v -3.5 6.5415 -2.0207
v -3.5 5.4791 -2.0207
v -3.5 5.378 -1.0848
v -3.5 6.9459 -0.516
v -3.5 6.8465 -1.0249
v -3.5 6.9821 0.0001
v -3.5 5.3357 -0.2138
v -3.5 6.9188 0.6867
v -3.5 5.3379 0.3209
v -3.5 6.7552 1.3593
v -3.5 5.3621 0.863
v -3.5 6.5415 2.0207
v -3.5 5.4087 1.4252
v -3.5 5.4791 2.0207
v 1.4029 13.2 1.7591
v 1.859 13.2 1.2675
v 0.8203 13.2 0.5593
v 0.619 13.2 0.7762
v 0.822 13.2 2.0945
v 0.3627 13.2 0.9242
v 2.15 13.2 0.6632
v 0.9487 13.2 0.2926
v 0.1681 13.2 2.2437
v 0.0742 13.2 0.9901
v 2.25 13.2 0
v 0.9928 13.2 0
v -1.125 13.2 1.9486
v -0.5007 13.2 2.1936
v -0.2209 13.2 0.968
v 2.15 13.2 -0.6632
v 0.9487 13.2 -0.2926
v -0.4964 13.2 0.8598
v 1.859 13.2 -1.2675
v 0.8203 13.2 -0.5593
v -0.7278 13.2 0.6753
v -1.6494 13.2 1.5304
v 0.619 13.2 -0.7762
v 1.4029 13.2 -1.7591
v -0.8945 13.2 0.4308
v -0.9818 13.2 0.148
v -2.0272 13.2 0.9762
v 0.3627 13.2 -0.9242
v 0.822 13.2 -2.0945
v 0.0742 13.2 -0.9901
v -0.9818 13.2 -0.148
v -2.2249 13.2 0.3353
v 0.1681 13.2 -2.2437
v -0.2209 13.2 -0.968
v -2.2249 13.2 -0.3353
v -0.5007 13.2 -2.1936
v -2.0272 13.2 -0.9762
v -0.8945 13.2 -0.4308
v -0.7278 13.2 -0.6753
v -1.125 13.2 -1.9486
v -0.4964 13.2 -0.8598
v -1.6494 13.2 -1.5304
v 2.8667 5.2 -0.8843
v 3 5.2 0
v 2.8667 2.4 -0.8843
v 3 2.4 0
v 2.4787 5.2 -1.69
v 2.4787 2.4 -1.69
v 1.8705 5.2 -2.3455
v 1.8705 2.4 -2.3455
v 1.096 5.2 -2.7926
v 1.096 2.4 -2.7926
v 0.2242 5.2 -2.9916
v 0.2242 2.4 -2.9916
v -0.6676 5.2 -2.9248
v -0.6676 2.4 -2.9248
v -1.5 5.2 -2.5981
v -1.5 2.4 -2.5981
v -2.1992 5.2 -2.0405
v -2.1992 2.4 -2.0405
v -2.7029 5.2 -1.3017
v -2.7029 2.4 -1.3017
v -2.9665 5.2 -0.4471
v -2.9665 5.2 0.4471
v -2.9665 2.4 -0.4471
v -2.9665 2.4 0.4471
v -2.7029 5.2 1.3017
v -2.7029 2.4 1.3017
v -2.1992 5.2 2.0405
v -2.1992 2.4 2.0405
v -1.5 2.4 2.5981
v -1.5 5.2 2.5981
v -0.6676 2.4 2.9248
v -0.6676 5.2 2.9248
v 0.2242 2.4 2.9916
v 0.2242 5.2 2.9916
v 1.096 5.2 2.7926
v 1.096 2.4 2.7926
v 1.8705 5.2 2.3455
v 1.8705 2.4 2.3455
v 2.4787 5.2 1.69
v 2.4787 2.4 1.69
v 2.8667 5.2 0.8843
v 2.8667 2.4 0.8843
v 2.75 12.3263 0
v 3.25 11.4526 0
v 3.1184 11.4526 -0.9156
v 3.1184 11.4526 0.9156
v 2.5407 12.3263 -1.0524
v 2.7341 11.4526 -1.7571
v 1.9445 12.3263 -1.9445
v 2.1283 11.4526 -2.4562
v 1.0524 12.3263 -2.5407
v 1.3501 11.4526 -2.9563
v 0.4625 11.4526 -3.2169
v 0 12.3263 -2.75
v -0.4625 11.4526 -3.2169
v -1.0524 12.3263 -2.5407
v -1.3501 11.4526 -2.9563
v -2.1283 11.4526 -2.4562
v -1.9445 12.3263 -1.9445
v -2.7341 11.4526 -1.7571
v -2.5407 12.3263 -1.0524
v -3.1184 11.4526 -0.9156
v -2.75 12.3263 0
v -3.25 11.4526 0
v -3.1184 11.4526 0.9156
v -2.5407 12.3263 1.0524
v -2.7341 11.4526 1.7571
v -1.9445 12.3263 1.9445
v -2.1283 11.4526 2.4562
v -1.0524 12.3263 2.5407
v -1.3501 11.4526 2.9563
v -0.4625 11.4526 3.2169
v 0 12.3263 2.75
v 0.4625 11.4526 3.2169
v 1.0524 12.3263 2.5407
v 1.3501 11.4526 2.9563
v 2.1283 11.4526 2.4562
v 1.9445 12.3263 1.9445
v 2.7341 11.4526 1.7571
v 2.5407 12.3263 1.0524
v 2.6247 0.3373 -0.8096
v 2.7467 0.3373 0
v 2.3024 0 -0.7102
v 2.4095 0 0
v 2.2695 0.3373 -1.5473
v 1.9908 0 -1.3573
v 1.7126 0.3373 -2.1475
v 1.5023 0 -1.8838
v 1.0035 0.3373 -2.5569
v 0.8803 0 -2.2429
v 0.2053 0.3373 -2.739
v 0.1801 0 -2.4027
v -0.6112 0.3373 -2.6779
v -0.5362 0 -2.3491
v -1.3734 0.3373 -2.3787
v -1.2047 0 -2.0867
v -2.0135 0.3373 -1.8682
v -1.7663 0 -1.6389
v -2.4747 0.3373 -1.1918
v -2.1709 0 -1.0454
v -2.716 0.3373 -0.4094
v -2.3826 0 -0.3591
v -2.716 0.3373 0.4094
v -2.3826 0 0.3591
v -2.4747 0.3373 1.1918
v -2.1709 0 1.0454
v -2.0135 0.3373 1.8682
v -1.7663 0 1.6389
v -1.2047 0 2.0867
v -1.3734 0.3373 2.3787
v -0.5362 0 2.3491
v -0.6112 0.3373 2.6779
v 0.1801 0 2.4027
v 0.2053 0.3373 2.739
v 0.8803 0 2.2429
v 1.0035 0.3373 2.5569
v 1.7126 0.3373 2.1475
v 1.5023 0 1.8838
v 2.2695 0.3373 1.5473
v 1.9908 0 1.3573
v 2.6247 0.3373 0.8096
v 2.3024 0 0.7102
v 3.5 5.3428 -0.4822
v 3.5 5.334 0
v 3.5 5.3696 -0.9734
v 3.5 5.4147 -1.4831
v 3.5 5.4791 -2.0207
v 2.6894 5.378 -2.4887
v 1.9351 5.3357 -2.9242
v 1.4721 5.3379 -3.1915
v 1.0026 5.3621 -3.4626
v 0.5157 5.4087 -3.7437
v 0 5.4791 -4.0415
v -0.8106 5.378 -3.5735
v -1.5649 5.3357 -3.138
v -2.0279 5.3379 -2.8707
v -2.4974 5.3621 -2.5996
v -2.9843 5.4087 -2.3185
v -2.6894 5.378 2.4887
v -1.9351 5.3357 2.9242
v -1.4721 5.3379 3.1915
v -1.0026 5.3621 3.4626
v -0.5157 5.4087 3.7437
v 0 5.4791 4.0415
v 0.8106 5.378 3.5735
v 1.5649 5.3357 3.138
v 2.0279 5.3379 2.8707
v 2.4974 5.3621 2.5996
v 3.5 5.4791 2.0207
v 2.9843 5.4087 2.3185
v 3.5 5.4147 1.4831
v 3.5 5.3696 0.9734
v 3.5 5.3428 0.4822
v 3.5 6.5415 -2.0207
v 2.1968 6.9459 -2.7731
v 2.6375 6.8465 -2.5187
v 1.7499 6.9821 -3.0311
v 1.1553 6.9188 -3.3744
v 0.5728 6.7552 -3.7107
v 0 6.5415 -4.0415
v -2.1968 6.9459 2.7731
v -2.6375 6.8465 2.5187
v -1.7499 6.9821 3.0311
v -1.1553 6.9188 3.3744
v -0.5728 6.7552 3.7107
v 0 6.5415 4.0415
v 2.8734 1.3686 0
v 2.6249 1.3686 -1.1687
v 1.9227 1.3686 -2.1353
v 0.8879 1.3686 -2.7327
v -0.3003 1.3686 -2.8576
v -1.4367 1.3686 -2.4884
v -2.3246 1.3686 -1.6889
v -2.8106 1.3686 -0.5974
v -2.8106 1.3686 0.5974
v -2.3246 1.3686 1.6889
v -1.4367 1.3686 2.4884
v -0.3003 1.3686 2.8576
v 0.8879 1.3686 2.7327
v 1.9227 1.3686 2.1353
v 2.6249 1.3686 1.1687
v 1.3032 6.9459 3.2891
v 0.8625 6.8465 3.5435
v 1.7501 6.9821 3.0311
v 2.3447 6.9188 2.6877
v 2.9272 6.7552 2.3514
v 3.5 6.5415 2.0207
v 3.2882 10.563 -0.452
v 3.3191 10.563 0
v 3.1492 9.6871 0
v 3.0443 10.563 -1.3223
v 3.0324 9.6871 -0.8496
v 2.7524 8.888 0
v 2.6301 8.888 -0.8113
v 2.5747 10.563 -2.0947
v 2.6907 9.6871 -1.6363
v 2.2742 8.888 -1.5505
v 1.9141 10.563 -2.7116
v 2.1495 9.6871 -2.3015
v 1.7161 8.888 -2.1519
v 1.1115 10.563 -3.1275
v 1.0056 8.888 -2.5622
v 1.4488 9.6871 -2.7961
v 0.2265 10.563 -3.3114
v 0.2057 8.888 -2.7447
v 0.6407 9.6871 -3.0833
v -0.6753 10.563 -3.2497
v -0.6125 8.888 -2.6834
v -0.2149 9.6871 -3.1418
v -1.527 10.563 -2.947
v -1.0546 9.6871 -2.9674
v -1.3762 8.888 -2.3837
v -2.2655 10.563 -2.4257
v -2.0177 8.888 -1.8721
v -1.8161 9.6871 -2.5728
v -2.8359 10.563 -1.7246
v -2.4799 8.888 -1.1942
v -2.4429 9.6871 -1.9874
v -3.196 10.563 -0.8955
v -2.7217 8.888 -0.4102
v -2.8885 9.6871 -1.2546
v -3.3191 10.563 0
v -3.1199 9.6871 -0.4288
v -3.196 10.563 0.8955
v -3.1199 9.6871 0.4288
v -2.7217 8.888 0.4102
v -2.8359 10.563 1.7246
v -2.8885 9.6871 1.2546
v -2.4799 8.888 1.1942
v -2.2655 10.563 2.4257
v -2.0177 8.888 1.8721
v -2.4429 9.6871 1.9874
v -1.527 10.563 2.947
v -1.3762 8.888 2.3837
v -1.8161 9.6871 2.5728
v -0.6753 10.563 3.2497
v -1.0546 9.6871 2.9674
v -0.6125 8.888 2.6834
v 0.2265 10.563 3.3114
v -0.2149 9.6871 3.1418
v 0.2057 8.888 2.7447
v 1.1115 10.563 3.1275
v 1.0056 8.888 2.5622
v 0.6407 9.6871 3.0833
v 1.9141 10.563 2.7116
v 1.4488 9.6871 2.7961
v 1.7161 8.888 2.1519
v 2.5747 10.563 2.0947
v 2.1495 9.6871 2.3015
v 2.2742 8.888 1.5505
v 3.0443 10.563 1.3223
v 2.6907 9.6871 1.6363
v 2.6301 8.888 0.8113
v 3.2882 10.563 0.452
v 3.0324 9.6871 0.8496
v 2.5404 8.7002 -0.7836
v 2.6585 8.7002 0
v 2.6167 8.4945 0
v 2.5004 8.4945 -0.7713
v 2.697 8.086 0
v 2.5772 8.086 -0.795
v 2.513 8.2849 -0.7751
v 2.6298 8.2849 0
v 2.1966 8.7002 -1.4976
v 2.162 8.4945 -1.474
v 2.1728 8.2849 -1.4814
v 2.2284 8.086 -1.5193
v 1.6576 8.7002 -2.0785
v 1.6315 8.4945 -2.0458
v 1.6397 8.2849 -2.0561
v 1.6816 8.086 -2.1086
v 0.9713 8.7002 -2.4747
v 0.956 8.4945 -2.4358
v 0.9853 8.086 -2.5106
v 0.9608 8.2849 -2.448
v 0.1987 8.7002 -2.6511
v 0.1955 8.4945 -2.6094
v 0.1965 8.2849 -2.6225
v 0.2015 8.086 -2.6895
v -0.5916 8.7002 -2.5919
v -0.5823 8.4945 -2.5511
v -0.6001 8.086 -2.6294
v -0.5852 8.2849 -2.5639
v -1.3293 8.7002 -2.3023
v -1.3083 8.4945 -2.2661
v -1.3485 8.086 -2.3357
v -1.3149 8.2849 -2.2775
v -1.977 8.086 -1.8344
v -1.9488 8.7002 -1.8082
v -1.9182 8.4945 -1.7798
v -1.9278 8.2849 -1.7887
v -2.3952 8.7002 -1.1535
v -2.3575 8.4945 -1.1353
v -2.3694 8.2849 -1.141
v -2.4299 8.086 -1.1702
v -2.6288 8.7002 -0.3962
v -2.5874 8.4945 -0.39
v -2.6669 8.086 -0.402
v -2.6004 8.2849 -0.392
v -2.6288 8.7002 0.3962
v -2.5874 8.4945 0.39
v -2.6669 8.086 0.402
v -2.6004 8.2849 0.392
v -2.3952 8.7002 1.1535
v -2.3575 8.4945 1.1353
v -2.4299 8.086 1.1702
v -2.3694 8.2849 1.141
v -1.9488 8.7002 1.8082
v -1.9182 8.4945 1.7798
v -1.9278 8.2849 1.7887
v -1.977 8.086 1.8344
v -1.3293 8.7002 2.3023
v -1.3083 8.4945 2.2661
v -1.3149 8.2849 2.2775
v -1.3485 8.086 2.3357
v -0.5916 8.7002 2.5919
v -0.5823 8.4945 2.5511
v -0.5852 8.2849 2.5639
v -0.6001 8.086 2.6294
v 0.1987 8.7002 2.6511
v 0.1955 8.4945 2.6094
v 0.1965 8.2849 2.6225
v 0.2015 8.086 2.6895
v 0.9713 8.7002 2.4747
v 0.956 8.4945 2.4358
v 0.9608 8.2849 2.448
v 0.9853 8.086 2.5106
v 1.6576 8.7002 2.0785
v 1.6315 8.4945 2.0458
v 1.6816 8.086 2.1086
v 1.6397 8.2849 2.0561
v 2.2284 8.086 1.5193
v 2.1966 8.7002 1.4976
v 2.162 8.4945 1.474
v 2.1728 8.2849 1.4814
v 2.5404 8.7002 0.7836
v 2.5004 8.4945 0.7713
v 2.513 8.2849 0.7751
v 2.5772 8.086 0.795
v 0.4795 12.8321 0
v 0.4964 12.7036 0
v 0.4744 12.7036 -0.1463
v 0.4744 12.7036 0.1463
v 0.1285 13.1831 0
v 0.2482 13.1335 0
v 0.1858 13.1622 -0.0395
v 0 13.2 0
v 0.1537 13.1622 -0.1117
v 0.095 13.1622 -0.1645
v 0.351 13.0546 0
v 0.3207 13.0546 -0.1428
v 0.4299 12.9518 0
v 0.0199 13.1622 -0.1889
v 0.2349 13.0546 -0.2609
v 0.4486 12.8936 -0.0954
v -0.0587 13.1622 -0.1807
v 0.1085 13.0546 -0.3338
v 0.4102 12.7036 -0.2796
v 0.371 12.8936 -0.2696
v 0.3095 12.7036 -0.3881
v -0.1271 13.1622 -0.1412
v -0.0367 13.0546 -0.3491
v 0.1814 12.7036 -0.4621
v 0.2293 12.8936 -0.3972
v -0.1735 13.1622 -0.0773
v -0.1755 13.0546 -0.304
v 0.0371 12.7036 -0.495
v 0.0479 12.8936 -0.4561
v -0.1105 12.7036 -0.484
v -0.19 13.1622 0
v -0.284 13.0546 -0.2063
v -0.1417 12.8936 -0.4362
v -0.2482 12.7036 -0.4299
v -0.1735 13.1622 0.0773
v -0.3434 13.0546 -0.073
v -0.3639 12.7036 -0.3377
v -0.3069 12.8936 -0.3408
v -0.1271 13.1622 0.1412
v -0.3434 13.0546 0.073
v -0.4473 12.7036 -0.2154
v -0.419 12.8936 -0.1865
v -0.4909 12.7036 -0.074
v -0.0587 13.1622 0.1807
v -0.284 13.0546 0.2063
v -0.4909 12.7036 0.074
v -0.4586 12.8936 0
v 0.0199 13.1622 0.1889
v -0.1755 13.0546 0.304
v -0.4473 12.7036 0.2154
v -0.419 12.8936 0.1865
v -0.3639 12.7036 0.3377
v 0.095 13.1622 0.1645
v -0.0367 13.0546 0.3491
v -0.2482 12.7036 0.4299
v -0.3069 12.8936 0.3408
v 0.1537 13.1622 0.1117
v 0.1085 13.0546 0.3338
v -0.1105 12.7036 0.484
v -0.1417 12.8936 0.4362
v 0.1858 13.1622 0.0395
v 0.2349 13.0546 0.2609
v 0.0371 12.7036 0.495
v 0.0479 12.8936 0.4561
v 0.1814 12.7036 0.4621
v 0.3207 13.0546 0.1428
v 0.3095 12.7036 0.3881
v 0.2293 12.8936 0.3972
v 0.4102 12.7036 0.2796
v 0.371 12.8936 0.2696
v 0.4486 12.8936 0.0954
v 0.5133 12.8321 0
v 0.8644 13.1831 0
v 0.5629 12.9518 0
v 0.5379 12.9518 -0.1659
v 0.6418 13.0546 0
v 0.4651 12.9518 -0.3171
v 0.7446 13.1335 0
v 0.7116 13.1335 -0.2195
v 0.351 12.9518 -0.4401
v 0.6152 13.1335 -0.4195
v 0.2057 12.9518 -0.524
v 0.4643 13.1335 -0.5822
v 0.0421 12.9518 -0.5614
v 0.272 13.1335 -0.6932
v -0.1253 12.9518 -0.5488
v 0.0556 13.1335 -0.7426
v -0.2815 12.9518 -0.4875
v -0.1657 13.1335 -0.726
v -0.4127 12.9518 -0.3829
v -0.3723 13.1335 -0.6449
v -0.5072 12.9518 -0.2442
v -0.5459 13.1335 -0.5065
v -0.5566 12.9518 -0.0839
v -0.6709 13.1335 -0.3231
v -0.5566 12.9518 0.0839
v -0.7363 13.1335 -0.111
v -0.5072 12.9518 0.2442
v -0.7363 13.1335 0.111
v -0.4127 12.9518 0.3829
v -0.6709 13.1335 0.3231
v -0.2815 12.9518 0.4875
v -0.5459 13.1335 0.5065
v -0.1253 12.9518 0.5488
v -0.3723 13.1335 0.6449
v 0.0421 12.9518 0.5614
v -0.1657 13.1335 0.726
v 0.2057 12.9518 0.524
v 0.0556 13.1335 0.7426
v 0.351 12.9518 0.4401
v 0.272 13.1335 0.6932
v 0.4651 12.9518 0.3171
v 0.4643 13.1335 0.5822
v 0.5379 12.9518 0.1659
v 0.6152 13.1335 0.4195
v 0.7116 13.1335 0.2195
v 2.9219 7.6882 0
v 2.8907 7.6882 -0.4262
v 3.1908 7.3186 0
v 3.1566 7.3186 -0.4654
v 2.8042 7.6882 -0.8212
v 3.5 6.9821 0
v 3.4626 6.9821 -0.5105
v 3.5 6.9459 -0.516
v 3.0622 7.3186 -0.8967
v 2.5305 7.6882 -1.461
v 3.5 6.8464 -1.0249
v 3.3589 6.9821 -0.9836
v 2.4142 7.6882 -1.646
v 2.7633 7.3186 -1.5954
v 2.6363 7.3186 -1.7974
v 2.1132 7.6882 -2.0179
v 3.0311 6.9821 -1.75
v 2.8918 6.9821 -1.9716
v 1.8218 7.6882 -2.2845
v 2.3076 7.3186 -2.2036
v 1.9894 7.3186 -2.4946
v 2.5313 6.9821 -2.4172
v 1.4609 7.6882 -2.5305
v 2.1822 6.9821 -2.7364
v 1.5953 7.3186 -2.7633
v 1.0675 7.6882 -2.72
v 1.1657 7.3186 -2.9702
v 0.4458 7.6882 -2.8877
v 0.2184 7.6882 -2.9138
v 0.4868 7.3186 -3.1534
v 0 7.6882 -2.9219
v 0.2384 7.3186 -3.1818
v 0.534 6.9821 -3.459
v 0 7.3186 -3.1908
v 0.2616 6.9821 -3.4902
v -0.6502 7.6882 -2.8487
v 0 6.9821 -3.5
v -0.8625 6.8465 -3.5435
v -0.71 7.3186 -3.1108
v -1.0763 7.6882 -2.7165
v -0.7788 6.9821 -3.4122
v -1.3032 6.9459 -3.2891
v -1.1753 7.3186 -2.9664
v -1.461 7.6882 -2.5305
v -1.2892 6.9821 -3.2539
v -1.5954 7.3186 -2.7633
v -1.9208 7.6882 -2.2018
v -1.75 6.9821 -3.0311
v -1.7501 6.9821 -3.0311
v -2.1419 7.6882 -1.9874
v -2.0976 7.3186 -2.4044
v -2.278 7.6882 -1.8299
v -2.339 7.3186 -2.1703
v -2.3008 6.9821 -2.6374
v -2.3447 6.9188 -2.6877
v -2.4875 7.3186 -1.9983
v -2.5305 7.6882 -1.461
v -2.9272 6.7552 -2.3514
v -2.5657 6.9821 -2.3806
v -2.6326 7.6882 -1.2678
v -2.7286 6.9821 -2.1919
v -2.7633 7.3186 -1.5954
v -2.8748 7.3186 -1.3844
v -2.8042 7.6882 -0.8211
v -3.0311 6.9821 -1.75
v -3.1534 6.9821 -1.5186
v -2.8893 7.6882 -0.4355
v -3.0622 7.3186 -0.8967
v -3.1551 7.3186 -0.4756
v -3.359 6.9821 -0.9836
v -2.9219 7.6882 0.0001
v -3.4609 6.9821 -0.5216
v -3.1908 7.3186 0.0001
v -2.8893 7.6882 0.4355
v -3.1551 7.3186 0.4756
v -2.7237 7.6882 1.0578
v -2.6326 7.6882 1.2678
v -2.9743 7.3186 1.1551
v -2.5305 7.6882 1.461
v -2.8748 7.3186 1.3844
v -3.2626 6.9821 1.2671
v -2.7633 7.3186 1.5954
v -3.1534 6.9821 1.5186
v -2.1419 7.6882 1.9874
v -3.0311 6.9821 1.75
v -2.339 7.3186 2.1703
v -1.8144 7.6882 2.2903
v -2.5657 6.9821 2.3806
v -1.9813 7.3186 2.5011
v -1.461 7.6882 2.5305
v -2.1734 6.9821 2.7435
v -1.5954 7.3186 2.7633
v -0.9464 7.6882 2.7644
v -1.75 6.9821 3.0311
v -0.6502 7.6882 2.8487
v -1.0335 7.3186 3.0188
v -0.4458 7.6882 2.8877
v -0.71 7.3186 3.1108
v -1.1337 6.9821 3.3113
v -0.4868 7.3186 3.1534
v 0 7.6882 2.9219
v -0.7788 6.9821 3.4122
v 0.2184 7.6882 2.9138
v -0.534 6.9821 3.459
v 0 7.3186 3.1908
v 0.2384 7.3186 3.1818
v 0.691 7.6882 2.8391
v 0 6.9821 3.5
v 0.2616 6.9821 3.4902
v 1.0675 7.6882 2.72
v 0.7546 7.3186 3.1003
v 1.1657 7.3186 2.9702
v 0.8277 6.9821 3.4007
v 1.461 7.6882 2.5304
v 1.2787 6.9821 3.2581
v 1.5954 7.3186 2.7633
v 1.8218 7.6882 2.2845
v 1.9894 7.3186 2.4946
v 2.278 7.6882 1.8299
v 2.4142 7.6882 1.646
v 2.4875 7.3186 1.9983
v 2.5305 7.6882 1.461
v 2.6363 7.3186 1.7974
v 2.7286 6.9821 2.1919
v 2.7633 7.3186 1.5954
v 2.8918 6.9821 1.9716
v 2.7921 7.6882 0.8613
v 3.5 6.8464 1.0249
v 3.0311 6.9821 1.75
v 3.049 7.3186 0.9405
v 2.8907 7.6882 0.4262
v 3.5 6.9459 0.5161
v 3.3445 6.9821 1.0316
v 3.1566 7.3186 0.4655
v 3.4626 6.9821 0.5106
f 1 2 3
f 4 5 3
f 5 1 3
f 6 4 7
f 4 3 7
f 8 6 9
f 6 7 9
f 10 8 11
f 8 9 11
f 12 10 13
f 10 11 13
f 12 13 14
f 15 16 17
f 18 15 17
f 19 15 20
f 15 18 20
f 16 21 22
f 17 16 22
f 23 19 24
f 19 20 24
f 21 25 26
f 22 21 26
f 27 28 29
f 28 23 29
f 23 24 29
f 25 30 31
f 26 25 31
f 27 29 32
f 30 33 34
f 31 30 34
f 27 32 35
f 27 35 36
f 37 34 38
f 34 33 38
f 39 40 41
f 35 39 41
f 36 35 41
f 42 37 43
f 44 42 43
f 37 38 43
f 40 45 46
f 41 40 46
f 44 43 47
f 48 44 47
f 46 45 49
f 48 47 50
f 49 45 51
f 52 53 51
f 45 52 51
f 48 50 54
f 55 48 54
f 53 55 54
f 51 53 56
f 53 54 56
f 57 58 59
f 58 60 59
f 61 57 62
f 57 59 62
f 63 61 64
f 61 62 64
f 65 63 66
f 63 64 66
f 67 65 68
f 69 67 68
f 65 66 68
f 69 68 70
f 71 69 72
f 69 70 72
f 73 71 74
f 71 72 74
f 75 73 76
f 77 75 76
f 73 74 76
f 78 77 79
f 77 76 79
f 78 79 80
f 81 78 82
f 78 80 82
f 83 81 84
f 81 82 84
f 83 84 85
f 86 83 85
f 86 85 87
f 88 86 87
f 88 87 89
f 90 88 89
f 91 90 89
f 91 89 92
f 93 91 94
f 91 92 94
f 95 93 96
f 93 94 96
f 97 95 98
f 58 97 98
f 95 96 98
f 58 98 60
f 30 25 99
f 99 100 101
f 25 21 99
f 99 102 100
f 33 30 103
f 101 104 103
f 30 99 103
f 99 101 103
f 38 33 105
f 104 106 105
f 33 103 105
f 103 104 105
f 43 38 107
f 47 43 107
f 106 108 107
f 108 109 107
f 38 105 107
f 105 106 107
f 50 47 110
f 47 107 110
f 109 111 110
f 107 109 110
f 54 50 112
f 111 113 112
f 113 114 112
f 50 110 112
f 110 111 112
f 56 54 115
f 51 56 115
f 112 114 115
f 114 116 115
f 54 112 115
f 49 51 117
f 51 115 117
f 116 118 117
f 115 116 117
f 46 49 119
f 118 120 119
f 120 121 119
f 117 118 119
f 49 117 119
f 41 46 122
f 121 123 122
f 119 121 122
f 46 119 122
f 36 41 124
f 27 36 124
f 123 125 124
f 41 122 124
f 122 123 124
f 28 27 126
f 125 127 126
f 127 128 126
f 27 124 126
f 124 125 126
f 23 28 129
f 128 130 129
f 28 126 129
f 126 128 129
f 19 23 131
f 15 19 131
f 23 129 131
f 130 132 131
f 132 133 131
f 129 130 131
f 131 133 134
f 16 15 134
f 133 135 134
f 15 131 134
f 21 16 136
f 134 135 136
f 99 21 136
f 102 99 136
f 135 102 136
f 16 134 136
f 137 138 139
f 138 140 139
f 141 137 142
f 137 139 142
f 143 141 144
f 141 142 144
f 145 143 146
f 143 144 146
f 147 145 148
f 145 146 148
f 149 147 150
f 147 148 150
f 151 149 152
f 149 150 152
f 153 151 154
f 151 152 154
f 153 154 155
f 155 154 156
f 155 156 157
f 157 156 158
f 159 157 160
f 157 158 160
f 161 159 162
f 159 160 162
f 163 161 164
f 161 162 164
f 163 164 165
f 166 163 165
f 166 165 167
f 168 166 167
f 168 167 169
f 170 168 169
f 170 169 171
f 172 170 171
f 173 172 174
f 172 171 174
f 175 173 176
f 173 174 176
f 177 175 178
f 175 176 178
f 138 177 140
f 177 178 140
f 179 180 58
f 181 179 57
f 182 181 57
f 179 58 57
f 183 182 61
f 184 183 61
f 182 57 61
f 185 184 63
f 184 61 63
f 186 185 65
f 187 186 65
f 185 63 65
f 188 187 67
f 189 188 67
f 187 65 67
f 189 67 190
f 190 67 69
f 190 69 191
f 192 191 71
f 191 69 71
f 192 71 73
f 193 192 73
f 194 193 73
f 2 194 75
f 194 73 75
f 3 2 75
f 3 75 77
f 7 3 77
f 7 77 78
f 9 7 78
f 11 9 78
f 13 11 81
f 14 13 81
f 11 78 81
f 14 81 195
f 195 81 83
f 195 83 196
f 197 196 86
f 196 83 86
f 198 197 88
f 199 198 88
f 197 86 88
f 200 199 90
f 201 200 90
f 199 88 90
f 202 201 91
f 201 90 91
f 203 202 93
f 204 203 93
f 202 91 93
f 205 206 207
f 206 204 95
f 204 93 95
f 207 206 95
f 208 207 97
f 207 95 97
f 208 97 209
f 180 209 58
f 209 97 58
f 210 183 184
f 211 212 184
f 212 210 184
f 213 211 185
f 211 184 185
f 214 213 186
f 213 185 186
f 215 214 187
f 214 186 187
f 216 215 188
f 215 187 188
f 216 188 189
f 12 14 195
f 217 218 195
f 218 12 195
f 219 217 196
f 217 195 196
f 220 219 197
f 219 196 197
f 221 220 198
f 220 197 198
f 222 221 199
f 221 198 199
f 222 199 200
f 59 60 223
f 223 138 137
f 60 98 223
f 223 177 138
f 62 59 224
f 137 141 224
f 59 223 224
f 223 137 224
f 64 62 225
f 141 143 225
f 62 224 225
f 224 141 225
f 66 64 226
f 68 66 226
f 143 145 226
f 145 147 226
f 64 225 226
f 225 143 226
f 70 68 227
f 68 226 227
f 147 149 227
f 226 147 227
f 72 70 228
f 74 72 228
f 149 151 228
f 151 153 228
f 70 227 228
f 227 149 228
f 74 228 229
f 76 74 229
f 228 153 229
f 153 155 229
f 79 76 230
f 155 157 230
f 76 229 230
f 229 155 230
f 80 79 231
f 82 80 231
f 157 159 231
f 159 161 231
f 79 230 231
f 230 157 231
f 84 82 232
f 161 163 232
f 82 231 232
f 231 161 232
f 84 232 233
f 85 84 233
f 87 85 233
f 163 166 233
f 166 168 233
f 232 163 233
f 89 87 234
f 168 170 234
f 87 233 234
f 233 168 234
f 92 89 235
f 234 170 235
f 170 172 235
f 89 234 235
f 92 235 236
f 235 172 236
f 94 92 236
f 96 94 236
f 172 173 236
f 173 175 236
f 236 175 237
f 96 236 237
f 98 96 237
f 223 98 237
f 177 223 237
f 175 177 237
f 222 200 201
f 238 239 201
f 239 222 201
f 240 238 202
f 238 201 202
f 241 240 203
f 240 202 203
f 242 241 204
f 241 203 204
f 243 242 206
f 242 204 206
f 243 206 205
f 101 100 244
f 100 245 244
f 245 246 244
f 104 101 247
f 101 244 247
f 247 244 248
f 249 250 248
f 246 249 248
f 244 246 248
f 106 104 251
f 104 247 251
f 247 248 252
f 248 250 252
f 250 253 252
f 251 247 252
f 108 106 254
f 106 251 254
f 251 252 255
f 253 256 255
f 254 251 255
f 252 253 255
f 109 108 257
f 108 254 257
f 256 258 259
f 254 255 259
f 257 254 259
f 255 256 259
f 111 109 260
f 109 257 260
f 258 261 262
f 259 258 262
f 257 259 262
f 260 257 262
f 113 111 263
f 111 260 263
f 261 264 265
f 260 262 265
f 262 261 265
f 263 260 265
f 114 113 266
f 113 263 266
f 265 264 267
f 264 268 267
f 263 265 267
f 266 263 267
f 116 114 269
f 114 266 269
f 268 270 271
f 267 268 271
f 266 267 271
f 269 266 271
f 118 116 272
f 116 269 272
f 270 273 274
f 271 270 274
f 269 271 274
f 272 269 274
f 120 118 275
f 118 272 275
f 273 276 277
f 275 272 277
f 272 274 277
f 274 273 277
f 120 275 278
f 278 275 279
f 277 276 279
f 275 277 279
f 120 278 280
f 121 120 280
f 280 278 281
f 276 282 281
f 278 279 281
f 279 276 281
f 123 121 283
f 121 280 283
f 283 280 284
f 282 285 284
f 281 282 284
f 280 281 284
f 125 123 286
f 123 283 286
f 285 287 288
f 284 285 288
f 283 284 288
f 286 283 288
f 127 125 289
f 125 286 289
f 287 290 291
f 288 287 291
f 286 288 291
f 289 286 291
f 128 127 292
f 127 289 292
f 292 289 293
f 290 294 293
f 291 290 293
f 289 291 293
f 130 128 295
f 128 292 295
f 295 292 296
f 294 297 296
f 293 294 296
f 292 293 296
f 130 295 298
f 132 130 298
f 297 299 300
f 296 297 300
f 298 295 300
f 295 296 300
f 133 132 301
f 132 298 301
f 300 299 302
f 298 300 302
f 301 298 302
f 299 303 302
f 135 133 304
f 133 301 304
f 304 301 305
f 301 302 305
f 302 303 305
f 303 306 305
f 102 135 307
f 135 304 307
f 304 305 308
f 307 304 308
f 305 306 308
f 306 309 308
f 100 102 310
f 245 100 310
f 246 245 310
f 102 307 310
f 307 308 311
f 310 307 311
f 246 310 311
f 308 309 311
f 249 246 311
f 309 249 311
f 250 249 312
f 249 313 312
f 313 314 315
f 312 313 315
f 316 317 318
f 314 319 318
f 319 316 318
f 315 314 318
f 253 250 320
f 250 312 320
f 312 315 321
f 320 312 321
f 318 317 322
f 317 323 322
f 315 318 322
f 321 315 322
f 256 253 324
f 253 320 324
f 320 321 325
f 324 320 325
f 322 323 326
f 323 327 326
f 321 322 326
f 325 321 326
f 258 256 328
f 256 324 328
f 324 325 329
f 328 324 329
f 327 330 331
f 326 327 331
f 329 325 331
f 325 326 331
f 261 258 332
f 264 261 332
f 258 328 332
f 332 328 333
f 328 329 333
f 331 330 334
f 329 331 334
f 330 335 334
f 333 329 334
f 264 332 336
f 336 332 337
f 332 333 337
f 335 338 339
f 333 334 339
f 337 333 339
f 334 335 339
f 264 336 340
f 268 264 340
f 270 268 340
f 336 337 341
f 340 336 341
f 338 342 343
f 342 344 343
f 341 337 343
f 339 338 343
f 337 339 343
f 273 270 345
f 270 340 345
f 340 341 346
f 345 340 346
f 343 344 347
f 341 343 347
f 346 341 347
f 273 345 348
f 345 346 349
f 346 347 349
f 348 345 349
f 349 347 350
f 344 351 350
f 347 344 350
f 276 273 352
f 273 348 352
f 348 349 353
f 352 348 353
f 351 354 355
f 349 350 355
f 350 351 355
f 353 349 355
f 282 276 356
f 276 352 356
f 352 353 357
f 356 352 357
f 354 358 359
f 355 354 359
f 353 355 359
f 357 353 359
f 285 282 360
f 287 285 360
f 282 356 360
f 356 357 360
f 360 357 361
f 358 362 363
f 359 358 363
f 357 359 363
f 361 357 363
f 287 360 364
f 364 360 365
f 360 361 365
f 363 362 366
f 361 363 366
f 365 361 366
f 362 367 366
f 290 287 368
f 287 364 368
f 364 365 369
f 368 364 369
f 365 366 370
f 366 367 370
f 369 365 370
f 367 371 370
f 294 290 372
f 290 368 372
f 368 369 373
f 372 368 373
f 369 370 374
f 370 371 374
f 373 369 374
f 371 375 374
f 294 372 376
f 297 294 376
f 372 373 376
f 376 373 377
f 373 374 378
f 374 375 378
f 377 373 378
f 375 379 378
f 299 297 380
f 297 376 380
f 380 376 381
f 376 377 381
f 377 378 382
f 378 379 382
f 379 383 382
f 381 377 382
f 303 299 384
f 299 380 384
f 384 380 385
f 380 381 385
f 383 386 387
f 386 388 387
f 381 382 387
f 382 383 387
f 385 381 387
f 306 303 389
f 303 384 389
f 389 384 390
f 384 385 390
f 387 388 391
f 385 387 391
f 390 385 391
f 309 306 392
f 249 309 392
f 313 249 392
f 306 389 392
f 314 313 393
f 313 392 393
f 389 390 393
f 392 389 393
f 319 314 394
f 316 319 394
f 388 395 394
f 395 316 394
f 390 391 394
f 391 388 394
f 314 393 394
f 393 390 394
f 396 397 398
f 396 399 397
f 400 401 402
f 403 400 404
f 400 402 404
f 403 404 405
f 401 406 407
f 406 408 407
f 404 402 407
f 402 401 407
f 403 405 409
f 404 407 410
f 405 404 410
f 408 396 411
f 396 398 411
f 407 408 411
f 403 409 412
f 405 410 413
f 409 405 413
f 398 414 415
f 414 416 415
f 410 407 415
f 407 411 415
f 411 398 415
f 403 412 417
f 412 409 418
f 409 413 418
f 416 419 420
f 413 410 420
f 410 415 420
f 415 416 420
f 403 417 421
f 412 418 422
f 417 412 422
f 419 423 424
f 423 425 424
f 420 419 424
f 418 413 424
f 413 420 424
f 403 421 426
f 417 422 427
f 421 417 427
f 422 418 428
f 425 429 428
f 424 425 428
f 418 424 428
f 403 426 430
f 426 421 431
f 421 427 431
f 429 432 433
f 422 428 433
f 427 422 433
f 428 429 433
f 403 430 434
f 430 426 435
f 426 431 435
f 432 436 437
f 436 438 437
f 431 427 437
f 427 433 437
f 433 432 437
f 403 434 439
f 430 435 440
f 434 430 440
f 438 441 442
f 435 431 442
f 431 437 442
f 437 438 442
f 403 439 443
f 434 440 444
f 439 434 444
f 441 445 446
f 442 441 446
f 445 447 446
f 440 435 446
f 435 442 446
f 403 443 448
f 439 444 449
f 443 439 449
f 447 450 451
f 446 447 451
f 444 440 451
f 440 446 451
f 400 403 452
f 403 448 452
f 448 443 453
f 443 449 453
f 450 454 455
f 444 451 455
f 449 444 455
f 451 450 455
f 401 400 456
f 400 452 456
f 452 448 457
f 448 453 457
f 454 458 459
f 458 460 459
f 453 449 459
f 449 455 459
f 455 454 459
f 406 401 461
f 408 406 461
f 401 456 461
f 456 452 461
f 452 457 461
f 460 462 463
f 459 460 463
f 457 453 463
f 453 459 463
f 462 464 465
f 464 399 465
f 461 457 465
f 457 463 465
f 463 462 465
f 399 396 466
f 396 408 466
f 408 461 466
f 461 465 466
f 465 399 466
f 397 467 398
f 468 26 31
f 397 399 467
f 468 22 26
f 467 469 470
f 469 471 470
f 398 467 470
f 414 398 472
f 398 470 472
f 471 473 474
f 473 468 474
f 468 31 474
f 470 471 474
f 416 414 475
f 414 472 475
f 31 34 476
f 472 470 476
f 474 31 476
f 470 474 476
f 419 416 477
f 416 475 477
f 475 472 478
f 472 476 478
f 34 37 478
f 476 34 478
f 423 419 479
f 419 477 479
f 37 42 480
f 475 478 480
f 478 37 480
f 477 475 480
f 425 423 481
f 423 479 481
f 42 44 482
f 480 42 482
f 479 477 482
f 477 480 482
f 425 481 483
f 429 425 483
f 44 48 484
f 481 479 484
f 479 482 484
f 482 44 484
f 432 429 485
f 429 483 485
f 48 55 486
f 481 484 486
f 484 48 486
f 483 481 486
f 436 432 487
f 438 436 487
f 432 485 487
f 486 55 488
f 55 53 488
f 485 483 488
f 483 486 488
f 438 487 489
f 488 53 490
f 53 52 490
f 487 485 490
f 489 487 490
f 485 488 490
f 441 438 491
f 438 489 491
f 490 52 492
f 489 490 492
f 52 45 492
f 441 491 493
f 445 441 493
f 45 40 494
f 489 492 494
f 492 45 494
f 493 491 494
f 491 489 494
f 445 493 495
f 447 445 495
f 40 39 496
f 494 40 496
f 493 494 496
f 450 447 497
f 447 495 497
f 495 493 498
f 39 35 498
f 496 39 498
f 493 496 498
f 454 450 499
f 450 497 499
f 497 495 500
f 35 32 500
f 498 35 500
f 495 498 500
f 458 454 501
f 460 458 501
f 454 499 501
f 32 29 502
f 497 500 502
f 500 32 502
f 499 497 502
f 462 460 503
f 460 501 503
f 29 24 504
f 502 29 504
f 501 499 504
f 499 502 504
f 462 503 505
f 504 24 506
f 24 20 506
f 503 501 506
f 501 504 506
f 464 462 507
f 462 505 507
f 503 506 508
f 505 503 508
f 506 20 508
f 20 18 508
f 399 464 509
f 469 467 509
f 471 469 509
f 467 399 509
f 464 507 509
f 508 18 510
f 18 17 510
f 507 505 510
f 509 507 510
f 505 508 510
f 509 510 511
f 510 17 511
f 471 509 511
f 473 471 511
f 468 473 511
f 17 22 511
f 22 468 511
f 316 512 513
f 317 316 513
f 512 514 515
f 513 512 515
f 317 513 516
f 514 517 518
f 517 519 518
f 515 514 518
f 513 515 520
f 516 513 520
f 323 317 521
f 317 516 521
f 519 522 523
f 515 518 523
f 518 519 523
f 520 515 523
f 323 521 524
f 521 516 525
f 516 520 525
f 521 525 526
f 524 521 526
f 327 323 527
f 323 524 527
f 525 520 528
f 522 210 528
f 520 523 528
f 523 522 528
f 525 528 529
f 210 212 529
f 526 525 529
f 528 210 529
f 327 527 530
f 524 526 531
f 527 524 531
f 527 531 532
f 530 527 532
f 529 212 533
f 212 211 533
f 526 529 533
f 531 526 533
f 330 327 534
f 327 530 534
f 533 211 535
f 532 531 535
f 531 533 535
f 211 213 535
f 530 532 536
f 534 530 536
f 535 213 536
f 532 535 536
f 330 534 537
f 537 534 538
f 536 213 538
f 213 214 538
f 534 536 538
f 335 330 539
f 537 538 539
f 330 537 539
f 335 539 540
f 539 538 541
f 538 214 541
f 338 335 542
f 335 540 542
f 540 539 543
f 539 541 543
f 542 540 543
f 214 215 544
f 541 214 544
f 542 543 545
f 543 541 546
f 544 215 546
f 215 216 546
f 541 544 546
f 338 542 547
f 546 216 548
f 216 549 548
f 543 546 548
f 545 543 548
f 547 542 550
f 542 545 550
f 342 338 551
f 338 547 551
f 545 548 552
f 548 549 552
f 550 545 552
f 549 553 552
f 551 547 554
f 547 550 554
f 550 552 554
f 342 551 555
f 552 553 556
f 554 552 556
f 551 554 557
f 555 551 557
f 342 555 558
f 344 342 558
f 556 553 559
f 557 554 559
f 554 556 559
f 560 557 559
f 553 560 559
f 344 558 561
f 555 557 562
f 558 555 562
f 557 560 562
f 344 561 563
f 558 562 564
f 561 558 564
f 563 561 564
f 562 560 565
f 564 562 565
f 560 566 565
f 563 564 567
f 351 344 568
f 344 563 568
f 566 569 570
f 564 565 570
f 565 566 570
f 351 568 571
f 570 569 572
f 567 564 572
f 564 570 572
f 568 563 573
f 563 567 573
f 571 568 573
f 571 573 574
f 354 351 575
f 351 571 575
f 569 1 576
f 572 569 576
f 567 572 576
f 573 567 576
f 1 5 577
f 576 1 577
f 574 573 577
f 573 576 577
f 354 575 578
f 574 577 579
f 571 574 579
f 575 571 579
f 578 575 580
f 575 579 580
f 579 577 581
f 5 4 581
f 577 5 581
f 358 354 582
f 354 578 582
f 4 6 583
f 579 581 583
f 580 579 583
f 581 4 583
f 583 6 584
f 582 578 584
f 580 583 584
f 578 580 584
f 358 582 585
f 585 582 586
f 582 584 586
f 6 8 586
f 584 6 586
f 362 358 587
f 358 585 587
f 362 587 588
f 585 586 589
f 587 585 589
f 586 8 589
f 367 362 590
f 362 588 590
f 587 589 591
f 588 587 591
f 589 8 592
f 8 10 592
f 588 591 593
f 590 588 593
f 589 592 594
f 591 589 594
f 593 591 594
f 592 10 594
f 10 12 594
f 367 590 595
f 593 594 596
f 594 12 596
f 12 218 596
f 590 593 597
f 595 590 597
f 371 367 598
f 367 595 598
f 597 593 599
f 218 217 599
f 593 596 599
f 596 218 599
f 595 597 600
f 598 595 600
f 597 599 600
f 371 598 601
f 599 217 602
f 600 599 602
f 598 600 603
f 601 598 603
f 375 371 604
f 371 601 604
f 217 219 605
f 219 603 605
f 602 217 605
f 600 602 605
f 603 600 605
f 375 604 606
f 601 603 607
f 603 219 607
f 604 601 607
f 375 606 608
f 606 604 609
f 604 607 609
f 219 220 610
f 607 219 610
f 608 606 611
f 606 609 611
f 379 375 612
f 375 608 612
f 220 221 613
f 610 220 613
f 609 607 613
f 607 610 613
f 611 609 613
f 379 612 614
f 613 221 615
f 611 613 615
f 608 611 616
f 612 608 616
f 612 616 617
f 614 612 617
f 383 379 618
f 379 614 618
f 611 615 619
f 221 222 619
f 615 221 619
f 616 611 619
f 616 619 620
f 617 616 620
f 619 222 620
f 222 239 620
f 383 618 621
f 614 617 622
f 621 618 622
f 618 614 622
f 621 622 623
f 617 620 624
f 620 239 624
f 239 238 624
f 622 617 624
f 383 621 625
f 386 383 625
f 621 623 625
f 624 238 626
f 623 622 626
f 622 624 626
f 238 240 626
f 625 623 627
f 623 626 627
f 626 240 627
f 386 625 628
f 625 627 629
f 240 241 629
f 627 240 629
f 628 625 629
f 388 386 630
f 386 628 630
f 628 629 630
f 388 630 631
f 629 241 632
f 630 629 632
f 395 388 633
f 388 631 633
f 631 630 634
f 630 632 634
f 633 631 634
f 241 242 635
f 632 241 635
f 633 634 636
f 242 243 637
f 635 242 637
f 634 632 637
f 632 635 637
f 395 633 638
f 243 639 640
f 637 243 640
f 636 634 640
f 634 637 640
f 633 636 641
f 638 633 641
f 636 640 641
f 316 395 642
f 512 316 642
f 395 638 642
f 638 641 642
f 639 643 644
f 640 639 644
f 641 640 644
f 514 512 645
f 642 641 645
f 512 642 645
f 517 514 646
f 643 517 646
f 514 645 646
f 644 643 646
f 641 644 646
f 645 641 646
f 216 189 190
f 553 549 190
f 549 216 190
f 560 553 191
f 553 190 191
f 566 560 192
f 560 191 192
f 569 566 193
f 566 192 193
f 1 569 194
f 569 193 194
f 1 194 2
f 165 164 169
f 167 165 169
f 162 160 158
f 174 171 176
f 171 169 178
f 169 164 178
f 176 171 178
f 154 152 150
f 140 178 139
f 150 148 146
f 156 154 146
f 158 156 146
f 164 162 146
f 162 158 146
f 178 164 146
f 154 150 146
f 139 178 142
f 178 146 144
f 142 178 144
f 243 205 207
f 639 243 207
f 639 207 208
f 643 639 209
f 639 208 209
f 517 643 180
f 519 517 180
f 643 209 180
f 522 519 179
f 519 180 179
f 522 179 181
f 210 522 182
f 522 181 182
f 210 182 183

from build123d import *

# Parameters (mm, degrees)
SKETCH4_OUTSIDE_W = 13.574
SKETCH4_OUTSIDE_H = 13.574
CUT_KEY_DEPTH     = 14.2


with BuildPart() as part:
    # Sketch6 → body (revolve)
    with BuildSketch(Plane.XY):
        with BuildLine():
            Line((0.992845254, 13.2), (2.25, 13.2))
            Line((2.25, 13.2), (3.25, 11.45255235))
            ThreePointArc((3.25, 11.45255235), (3.263671492, 10.119347494), (2.752432371, 8.887983756))
            ThreePointArc((2.752432371, 8.887983756), (2.616668661, 8.494453666), (2.697011723, 8.085989826))
            ThreePointArc((2.697011723, 8.085989826), (3.268727336, 7.226263337), (4.041451884, 6.541511445))
            Line((4.041451884, 6.541511445), (4.041451884, 5.479056191))
            Line((4.041451884, 5.479056191), (3, 5.2))
            Line((3, 5.2), (3, 2.4))
            Line((3, 2.4), (2.746726841, 0.337255649))
            Line((2.746726841, 0.337255649), (2.409471192, 0))
            Line((2.409471192, 0), (0, 0))
            Line((0, 0), (0, 13.2))
            ThreePointArc((0, 13.2), (0.351023806, 13.054601179), (0.496422627, 12.703577373))
            ThreePointArc((0.496422627, 12.703577373), (0.641821448, 13.054601179), (0.992845254, 13.2))
        make_face()
    revolve(axis=Axis((0, 0, 0), (0, 1, 0)))

    # Sketch4 outside → cut-key (cut, through all)
    with BuildSketch(Plane(origin=(0, 0, 0), x_dir=(1, 0, 0), z_dir=(0, 1, 0))):
        Rectangle(SKETCH4_OUTSIDE_W, SKETCH4_OUTSIDE_H)
        Polygon((3.5, -2.020725942), (3.5, 2.020725942), (0, 4.041451884), (-3.5, 2.020725942), (-3.5, -2.020725942), (0, -4.041451884), align=None, mode=Mode.SUBTRACT)
    extrude(amount=CUT_KEY_DEPTH, mode=Mode.SUBTRACT)


solid = part.part
